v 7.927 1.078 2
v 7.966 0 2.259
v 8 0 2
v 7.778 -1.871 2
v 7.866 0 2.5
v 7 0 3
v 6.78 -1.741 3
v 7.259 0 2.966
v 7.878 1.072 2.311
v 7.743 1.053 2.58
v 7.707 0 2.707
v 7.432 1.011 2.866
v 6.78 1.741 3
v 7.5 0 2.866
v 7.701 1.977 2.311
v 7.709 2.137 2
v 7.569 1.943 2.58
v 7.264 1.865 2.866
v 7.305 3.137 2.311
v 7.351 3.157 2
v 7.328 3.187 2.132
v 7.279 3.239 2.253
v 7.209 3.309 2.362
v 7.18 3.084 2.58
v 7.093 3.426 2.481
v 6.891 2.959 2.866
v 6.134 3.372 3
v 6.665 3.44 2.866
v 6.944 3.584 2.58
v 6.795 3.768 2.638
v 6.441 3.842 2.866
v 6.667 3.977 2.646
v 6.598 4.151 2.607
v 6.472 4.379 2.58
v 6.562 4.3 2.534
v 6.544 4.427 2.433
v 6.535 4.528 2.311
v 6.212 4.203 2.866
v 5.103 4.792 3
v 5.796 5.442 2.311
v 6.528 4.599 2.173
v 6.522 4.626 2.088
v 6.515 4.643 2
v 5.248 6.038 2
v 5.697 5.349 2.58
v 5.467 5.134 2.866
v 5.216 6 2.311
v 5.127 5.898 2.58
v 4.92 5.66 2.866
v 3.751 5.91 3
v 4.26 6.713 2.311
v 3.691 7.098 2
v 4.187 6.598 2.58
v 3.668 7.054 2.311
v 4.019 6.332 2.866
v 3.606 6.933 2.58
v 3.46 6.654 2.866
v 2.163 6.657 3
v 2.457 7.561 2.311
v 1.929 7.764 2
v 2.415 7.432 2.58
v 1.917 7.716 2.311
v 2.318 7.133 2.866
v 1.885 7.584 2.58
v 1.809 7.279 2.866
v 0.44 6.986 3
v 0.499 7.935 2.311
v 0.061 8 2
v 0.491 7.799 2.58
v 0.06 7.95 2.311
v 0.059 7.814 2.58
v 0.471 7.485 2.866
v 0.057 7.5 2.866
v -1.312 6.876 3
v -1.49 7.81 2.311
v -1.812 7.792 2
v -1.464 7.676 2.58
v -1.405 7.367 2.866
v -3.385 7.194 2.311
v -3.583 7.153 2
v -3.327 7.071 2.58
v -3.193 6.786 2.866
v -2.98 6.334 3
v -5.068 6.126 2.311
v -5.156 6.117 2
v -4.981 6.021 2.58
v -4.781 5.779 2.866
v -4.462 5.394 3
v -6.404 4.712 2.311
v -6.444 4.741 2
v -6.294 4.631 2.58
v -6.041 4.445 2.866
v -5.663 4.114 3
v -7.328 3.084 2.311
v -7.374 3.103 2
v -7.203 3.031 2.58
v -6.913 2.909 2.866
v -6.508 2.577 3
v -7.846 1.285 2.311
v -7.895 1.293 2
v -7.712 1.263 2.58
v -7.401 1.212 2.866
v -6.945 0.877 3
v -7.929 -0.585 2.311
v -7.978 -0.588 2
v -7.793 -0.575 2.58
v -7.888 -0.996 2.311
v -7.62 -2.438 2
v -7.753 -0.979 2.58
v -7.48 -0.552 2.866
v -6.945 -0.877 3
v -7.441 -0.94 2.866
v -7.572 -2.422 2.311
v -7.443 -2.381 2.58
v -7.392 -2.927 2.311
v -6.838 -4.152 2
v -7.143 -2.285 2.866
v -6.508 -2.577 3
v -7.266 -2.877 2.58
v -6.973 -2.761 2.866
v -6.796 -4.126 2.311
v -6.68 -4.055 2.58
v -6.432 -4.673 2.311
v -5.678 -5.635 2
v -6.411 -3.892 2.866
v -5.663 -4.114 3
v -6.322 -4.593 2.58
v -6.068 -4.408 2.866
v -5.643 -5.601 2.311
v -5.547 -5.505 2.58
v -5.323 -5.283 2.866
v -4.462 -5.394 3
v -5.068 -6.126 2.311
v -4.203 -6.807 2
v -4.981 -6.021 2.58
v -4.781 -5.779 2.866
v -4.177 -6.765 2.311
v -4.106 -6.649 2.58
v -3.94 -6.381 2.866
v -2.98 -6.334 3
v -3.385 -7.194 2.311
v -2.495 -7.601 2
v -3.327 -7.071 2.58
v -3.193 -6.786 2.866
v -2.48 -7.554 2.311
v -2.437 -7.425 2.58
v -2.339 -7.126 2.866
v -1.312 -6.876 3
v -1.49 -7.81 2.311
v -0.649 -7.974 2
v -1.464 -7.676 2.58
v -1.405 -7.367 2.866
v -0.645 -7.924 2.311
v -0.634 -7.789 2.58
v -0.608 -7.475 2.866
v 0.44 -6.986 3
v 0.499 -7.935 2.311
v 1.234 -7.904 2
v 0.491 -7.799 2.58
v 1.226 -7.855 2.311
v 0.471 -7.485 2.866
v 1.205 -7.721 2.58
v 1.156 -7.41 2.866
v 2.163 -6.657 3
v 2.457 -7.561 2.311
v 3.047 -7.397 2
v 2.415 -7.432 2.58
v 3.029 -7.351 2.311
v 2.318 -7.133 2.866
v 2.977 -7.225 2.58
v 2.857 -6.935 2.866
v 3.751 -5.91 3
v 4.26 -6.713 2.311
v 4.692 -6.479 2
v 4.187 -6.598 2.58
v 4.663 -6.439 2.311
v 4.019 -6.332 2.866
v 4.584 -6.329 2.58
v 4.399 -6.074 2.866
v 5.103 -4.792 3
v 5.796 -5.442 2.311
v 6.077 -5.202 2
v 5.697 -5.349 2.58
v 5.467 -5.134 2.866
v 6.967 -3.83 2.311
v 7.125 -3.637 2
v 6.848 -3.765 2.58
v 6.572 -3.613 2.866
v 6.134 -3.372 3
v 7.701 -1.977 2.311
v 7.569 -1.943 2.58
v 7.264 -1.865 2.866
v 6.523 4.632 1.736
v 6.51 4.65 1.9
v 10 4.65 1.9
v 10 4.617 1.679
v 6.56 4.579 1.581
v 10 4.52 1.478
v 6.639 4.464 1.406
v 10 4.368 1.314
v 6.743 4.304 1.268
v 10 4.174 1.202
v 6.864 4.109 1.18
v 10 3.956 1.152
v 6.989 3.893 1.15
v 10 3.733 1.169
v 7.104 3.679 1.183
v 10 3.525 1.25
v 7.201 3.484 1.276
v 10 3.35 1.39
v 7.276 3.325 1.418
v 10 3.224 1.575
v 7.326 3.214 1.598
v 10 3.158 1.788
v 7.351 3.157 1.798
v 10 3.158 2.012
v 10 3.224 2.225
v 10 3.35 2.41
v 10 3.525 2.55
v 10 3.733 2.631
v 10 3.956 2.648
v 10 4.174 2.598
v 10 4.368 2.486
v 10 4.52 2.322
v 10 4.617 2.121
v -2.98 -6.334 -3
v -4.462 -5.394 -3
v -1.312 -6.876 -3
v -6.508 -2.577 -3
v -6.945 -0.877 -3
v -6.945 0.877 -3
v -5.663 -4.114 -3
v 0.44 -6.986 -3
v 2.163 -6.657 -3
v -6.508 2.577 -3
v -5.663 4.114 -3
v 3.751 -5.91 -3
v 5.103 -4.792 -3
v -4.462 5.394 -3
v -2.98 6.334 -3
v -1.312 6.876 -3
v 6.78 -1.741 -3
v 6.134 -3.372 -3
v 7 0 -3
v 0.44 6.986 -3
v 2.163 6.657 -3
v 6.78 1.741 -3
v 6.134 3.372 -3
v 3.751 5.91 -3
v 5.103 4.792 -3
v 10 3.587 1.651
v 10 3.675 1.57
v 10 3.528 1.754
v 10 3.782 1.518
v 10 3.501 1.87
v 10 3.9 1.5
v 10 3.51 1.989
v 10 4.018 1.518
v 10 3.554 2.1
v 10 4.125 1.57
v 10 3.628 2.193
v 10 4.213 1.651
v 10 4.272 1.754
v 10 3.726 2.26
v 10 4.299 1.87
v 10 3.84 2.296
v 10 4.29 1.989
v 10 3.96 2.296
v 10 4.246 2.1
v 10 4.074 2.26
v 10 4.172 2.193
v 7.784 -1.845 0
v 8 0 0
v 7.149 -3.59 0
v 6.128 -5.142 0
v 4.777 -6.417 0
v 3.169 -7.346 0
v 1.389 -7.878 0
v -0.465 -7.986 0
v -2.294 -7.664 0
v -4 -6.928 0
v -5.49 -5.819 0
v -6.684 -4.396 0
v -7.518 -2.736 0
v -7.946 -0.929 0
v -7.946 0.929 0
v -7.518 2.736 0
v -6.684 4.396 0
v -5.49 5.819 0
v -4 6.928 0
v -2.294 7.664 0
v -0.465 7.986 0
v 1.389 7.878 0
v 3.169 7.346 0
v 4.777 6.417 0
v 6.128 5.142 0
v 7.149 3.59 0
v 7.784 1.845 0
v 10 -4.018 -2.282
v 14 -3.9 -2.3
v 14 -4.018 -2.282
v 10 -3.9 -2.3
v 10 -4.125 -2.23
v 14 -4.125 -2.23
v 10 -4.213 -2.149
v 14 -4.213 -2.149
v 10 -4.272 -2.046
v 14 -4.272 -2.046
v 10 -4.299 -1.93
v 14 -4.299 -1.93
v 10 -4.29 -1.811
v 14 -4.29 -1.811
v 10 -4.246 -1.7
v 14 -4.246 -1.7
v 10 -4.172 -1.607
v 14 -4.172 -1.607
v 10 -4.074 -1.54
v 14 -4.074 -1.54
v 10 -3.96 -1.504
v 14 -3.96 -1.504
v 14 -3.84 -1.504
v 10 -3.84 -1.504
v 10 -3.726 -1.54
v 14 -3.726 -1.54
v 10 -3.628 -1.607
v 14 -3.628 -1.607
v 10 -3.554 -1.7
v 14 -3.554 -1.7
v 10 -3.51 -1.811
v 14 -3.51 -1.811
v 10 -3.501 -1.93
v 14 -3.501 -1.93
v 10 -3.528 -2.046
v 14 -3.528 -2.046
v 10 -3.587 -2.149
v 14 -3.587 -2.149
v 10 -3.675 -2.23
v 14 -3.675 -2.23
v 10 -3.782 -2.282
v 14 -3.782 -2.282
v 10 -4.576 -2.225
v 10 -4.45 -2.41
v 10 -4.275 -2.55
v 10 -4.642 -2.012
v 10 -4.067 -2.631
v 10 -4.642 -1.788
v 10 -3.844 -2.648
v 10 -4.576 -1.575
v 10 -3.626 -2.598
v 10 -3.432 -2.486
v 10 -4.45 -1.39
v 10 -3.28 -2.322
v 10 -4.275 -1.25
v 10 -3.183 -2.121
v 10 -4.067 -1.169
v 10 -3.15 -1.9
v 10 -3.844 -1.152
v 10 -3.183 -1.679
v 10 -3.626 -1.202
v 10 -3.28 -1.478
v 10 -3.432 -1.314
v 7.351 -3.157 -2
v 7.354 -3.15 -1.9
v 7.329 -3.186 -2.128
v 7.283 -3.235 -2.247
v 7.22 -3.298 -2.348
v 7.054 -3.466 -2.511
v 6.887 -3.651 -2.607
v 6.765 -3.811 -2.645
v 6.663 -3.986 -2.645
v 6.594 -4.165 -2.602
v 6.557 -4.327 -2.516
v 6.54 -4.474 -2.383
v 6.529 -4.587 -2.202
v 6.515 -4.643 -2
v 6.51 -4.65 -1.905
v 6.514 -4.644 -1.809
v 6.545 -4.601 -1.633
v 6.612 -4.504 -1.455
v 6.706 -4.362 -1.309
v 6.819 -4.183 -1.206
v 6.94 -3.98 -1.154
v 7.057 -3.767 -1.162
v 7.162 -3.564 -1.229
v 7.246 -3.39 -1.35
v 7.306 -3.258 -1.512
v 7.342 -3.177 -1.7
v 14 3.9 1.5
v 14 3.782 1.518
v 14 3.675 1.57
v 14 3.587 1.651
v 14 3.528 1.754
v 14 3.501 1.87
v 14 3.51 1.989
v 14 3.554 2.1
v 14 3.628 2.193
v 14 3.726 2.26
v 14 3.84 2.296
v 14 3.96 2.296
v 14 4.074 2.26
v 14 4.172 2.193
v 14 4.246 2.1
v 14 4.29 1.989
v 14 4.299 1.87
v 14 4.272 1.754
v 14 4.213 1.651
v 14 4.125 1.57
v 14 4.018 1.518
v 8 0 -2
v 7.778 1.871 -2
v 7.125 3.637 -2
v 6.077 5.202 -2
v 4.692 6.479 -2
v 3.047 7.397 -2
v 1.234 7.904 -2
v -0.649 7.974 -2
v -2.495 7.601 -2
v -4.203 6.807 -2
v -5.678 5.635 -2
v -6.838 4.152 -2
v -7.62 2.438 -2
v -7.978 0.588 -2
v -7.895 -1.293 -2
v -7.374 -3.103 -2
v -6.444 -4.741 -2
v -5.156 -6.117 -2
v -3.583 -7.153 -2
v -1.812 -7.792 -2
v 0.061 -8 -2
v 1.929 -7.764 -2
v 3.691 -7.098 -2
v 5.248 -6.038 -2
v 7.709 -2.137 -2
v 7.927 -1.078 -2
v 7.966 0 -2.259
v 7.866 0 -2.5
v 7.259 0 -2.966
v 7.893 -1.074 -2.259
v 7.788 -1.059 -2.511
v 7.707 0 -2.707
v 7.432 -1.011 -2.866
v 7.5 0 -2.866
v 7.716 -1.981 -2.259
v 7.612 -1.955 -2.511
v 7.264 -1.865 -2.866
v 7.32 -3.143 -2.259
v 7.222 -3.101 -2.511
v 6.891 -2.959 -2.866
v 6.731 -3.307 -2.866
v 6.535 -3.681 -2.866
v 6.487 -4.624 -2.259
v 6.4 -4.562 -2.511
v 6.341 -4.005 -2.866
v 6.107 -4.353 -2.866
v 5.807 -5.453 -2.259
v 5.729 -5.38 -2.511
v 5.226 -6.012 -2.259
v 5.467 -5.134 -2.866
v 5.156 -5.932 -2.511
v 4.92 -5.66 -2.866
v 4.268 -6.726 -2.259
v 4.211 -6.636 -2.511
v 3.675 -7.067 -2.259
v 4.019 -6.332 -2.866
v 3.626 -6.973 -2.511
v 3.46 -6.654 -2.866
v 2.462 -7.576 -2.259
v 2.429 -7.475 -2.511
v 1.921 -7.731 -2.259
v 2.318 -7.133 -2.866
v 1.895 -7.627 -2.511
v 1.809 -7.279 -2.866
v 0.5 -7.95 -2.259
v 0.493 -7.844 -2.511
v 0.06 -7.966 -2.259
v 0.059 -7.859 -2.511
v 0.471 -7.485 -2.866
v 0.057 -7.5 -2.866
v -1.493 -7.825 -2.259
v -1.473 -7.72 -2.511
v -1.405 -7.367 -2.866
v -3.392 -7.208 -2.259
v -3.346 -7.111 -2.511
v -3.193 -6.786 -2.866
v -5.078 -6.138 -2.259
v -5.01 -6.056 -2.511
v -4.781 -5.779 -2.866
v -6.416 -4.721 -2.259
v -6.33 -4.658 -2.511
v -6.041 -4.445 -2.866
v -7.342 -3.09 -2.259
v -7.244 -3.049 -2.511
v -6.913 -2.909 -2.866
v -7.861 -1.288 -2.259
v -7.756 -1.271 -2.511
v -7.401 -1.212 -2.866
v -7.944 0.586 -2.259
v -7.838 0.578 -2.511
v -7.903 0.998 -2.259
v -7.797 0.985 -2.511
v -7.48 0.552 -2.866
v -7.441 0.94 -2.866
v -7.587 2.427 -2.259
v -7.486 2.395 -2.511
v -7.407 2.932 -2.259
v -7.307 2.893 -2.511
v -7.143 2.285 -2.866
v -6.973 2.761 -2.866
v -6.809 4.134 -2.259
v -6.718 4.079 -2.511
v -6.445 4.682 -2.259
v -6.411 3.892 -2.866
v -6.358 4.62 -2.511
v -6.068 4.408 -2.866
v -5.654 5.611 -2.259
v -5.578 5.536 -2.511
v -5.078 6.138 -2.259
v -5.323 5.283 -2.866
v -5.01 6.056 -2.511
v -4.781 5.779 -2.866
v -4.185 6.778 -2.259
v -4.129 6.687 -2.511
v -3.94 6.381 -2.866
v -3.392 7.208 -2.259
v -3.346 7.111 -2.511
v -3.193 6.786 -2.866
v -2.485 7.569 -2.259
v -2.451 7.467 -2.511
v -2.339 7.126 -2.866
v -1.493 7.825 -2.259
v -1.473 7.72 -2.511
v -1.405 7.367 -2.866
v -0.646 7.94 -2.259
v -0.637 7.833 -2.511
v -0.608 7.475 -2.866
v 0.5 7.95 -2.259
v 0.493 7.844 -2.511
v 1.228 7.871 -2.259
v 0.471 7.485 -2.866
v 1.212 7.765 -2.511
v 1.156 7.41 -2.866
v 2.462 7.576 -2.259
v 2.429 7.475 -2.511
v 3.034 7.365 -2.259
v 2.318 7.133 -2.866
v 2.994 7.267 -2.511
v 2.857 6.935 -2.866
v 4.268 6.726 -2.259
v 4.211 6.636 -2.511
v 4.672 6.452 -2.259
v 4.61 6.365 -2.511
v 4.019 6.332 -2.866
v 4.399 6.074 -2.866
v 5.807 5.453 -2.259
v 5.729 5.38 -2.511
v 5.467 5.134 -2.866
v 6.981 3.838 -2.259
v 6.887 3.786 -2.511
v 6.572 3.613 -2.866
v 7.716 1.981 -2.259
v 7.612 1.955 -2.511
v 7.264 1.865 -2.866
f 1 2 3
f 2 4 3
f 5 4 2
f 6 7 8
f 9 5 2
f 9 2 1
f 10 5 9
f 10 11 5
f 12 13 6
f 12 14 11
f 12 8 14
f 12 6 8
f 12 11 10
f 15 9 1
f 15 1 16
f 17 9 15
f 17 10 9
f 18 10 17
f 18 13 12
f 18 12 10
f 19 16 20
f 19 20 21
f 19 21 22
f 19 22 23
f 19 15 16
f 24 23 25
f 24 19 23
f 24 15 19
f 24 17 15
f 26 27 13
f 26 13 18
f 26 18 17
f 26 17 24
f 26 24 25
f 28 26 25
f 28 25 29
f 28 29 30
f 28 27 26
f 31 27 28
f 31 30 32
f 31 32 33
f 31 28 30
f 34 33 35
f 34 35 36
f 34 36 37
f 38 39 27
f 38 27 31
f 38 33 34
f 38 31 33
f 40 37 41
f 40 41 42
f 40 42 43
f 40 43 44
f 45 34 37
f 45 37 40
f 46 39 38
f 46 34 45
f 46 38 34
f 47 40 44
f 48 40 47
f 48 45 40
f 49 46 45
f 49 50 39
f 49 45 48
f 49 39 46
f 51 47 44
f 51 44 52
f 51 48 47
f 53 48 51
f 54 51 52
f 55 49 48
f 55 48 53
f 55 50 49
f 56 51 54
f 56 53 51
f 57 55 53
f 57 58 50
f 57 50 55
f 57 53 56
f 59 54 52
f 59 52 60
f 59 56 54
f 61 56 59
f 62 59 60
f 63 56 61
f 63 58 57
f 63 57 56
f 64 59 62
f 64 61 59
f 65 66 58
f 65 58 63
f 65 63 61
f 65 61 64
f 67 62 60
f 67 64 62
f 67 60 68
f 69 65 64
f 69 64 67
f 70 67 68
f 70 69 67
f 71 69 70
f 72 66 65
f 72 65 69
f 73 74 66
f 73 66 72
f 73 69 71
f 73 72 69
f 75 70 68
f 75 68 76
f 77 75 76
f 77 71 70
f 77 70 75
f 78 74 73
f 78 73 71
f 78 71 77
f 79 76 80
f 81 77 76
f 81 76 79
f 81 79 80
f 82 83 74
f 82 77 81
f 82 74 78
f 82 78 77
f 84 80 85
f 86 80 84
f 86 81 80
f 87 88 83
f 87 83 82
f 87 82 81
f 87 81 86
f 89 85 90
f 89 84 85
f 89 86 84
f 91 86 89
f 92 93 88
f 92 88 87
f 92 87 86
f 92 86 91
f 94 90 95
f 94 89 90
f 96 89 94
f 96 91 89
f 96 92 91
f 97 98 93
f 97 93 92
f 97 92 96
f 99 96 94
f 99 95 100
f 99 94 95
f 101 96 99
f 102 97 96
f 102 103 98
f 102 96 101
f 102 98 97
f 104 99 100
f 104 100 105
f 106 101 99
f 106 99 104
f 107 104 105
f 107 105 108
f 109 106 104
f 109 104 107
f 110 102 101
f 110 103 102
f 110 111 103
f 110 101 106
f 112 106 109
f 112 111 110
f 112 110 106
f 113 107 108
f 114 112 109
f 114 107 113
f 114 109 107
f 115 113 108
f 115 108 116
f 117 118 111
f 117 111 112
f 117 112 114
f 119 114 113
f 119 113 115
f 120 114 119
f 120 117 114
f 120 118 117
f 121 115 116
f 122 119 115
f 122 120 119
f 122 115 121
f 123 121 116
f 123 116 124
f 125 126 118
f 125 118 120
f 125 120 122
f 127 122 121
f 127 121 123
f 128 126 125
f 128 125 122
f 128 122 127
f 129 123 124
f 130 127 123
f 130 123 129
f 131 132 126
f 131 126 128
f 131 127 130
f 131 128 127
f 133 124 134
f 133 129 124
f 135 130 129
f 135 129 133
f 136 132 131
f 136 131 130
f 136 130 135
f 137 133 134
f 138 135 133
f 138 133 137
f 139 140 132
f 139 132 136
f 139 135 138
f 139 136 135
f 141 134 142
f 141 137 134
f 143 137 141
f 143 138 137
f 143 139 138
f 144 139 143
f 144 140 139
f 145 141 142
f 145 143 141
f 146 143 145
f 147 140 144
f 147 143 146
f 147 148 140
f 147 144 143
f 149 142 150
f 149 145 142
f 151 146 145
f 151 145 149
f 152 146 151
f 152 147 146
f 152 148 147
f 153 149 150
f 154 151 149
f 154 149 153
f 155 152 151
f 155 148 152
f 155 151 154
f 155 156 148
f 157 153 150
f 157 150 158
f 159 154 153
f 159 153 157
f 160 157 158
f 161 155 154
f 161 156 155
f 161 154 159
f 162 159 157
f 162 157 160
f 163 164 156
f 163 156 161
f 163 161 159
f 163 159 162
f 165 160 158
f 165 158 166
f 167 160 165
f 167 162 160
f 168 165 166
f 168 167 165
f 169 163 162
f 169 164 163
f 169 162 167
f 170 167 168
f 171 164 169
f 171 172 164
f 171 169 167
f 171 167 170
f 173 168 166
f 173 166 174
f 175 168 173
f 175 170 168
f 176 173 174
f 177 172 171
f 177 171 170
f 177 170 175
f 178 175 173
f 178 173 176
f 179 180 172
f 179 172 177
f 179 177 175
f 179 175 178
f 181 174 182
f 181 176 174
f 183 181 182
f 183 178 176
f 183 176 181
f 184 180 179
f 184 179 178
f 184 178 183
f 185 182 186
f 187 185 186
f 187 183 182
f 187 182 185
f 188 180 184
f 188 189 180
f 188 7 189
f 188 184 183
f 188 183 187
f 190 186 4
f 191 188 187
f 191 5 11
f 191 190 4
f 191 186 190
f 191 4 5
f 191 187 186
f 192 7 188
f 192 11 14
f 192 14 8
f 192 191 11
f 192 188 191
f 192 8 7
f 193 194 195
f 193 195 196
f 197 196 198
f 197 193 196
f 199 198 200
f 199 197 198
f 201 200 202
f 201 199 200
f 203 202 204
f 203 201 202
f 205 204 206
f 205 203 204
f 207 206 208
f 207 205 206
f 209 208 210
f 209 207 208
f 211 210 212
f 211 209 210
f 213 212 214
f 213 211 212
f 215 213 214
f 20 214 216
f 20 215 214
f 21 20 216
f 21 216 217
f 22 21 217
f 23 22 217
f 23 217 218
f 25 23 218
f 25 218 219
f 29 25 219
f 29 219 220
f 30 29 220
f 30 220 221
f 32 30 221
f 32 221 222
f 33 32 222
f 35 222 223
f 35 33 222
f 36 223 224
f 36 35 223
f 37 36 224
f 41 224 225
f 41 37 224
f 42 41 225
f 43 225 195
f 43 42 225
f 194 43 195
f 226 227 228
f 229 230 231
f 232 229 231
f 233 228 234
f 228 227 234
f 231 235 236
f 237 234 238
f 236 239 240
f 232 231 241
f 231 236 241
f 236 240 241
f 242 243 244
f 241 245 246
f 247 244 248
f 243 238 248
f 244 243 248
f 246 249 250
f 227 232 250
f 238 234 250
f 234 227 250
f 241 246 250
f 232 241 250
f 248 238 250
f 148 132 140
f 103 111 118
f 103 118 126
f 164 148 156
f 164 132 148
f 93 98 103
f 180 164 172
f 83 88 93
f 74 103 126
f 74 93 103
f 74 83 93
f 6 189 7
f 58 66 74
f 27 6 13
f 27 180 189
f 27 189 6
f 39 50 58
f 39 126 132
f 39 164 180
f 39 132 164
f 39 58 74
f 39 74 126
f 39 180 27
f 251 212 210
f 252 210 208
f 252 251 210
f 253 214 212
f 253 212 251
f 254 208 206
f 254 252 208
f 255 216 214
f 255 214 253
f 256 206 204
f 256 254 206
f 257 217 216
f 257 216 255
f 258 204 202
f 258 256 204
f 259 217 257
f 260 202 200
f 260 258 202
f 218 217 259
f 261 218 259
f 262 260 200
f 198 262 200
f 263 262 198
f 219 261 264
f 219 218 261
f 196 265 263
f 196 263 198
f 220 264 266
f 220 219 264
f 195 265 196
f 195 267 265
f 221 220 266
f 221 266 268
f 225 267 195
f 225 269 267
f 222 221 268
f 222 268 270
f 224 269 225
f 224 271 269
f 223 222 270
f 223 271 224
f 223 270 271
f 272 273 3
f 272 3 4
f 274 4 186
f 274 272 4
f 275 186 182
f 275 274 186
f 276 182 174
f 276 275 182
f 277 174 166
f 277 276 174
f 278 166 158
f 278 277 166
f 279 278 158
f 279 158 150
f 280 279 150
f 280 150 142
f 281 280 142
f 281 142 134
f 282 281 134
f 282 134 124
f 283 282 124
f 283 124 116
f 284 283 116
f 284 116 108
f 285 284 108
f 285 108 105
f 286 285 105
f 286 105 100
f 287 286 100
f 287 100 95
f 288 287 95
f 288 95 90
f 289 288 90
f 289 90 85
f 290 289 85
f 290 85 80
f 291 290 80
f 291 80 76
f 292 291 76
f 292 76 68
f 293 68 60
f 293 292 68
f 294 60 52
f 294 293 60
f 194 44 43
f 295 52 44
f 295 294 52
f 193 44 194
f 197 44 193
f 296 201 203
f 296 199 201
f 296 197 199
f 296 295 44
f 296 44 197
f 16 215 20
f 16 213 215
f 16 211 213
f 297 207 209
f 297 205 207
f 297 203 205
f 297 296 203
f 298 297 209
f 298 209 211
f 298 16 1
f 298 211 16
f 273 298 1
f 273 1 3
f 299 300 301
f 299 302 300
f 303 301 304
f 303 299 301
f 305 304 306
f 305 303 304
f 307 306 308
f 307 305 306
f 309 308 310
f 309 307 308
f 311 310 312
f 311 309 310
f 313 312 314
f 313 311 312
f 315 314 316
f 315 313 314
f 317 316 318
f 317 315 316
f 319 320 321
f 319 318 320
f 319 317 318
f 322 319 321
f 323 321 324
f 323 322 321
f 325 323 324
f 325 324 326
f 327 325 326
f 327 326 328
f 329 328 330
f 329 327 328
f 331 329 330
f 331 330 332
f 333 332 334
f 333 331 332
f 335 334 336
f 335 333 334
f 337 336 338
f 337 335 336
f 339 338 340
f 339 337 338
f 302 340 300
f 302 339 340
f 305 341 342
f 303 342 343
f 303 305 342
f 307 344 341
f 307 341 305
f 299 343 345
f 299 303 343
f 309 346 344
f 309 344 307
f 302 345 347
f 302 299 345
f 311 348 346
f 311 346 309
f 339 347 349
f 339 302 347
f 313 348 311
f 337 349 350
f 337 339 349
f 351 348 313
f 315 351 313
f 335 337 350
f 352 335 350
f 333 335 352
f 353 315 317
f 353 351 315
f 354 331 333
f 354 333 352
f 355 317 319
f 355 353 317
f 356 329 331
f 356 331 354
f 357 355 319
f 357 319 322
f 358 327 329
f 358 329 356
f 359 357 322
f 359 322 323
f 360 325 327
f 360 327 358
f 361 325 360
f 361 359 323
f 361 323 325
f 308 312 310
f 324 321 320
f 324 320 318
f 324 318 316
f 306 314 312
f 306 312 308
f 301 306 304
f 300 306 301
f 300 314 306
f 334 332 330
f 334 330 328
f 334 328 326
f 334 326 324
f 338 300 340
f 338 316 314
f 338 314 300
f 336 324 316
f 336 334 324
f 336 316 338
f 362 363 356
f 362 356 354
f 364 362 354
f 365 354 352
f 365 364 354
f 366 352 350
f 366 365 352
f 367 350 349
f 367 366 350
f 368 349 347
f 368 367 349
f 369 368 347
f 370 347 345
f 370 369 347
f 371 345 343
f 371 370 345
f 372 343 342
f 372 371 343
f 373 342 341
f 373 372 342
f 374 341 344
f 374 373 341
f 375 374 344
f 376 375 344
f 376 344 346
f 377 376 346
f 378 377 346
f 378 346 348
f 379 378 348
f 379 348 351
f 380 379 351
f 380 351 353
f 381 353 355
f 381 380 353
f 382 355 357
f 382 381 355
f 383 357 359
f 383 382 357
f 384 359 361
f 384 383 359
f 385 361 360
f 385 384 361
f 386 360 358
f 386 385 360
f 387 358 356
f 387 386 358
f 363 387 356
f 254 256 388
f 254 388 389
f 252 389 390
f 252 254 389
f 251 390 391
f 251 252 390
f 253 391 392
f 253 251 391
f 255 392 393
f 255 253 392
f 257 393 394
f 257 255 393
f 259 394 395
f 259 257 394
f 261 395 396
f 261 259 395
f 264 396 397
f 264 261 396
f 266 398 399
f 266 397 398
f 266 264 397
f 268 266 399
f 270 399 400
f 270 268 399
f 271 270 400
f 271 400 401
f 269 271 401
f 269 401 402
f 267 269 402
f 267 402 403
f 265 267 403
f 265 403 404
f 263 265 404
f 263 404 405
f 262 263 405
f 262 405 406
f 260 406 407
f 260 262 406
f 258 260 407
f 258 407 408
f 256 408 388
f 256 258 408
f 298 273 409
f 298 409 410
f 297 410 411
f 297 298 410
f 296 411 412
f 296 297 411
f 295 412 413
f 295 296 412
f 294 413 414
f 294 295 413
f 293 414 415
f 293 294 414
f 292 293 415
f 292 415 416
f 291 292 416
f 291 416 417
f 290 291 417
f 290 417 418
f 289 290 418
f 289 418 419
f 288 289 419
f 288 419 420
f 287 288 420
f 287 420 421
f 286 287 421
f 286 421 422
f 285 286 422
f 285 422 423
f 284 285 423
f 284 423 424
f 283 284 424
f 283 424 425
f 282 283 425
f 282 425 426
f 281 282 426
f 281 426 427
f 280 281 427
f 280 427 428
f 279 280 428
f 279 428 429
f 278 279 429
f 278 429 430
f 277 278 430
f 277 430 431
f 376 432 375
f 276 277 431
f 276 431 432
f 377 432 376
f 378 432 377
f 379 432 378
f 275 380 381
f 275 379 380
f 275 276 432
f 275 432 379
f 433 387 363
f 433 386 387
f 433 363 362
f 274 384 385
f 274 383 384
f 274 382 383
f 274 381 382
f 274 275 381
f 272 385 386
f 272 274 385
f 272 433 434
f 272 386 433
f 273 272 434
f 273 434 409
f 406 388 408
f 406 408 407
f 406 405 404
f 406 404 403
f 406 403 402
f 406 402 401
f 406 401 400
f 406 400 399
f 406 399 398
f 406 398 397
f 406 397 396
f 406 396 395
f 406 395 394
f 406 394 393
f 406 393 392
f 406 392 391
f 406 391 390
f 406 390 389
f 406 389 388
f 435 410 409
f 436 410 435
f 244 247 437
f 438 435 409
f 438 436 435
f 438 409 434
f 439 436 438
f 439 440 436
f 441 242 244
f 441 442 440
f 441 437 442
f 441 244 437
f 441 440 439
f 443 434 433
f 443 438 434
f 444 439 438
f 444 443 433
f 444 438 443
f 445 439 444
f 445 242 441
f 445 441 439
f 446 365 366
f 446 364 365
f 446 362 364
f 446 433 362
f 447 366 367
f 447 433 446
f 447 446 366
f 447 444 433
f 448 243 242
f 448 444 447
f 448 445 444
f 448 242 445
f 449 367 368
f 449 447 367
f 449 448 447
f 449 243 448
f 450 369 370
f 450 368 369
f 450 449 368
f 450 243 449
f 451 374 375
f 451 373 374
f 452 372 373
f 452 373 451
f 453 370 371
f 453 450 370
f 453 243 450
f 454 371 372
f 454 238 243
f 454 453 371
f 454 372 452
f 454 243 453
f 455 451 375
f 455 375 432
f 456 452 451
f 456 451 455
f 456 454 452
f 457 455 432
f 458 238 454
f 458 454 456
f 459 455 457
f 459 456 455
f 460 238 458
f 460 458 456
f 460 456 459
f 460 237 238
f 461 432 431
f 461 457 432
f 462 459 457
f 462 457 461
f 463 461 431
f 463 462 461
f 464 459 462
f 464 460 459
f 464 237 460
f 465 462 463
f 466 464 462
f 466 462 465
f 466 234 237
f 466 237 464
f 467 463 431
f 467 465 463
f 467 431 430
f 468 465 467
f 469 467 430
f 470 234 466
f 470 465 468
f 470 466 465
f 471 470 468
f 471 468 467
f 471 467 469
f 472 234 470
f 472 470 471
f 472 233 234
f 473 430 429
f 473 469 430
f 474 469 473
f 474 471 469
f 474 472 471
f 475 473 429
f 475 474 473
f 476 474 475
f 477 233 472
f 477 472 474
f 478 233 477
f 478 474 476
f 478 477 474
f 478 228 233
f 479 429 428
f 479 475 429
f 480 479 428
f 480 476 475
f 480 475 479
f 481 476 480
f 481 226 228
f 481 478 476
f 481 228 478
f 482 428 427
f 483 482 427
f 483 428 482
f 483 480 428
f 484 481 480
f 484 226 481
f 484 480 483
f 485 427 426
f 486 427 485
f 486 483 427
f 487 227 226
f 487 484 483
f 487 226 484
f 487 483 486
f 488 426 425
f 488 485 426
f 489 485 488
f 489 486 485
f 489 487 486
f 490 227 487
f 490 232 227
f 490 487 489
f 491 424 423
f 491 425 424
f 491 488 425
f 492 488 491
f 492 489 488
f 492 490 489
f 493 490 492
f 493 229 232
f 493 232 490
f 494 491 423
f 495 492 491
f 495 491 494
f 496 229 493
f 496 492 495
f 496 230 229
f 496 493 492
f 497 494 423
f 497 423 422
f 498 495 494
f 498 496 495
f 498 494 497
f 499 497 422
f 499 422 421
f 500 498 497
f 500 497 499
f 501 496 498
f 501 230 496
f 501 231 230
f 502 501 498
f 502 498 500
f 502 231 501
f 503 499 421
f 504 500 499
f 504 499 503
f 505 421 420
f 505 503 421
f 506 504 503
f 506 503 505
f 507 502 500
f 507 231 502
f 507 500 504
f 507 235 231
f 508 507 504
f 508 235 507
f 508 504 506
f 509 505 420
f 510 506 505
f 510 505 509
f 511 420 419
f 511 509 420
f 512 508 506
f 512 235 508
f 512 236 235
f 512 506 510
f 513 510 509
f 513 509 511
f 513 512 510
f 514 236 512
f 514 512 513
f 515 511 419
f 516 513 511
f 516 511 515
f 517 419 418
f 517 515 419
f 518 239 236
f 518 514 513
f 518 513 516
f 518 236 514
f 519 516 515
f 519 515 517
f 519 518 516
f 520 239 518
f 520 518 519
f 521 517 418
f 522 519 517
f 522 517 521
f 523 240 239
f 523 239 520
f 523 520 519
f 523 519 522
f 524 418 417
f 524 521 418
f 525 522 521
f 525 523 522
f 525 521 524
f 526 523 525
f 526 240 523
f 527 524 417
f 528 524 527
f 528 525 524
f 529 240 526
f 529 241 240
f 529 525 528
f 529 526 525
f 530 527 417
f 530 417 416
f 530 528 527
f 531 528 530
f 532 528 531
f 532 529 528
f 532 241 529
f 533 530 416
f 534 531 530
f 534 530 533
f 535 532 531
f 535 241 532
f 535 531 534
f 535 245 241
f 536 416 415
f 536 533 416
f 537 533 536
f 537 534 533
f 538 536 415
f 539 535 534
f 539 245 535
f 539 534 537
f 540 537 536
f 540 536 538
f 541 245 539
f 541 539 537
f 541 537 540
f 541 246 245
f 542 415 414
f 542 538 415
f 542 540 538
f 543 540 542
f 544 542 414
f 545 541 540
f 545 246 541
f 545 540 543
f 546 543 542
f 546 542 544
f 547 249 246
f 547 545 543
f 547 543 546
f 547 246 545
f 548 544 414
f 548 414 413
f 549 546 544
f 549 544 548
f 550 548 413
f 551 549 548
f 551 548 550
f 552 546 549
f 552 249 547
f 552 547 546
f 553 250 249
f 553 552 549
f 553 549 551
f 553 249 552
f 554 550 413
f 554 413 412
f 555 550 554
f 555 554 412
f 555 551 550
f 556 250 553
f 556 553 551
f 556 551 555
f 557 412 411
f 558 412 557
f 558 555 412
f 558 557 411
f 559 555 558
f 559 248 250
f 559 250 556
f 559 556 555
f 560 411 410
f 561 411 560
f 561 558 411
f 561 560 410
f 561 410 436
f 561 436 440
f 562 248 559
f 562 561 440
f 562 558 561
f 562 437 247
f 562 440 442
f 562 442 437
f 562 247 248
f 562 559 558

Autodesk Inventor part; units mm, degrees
ref_plane "YZ Plane" through (0, 0, 0) normal (1, 0, 0) x (0, 1, 0)
ref_plane "XZ Plane" through (0, 0, 0) normal (0, 1, 0) x (-1, 0, 0)
ref_plane "XY Plane" through (0, 0, 0) normal (0, 0, 1) x (1, 0, 0)
sketch "Sketch1" plane through (0, 0, 0) normal (0, 0, 1) x (1, 0, 0)
  circle A0 centre (0, 0) radius 8
  dimension "d0" = 16
extrude "Extrusion1" add sketch "Sketch1" along normal mid plane 6
fillet "Fillet1" radius 1 2 edges at (-8, 0, 3) (-8, 0, -3)
sketch "Sketch2" plane through (0, 0, 0) normal (1, 0, 0) x (0, 1, 0)
  circle A0 centre (3.9, 1.9) radius 0.75
  circle A1 centre (-3.9, -1.9) radius 0.75
  point P0 (0, 0)
  dimension "d4" = 3.9
  dimension "d5" = 3.9
  dimension "d8" = 1.5
  dimension "d9" = 1.5
  dimension "d20" = 1.9
  dimension "d21" = 1.9
extrude "Extrusion2" add sketch "Sketch2" along normal blind 10
sketch "Sketch3" plane through (10, 3.9, 1.9) normal (1, 0, 0) x (0, 0, -1)
  circle A0 centre (0, 0) radius 0.4
  circle A1 centre (3.8, -7.8) radius 0.4
  point P0 (1.9, -3.9)
  dimension "d14" = 3.9
  dimension "d15" = 3.9
  dimension "d16" = 0.8
  dimension "d17" = 0.8
  dimension "d22" = 1.9
  dimension "d23" = 1.9
extrude "Extrusion3" add sketch "Sketch3" along normal blind 4
properties part number "16mm_7_2mmDiskPTC"
